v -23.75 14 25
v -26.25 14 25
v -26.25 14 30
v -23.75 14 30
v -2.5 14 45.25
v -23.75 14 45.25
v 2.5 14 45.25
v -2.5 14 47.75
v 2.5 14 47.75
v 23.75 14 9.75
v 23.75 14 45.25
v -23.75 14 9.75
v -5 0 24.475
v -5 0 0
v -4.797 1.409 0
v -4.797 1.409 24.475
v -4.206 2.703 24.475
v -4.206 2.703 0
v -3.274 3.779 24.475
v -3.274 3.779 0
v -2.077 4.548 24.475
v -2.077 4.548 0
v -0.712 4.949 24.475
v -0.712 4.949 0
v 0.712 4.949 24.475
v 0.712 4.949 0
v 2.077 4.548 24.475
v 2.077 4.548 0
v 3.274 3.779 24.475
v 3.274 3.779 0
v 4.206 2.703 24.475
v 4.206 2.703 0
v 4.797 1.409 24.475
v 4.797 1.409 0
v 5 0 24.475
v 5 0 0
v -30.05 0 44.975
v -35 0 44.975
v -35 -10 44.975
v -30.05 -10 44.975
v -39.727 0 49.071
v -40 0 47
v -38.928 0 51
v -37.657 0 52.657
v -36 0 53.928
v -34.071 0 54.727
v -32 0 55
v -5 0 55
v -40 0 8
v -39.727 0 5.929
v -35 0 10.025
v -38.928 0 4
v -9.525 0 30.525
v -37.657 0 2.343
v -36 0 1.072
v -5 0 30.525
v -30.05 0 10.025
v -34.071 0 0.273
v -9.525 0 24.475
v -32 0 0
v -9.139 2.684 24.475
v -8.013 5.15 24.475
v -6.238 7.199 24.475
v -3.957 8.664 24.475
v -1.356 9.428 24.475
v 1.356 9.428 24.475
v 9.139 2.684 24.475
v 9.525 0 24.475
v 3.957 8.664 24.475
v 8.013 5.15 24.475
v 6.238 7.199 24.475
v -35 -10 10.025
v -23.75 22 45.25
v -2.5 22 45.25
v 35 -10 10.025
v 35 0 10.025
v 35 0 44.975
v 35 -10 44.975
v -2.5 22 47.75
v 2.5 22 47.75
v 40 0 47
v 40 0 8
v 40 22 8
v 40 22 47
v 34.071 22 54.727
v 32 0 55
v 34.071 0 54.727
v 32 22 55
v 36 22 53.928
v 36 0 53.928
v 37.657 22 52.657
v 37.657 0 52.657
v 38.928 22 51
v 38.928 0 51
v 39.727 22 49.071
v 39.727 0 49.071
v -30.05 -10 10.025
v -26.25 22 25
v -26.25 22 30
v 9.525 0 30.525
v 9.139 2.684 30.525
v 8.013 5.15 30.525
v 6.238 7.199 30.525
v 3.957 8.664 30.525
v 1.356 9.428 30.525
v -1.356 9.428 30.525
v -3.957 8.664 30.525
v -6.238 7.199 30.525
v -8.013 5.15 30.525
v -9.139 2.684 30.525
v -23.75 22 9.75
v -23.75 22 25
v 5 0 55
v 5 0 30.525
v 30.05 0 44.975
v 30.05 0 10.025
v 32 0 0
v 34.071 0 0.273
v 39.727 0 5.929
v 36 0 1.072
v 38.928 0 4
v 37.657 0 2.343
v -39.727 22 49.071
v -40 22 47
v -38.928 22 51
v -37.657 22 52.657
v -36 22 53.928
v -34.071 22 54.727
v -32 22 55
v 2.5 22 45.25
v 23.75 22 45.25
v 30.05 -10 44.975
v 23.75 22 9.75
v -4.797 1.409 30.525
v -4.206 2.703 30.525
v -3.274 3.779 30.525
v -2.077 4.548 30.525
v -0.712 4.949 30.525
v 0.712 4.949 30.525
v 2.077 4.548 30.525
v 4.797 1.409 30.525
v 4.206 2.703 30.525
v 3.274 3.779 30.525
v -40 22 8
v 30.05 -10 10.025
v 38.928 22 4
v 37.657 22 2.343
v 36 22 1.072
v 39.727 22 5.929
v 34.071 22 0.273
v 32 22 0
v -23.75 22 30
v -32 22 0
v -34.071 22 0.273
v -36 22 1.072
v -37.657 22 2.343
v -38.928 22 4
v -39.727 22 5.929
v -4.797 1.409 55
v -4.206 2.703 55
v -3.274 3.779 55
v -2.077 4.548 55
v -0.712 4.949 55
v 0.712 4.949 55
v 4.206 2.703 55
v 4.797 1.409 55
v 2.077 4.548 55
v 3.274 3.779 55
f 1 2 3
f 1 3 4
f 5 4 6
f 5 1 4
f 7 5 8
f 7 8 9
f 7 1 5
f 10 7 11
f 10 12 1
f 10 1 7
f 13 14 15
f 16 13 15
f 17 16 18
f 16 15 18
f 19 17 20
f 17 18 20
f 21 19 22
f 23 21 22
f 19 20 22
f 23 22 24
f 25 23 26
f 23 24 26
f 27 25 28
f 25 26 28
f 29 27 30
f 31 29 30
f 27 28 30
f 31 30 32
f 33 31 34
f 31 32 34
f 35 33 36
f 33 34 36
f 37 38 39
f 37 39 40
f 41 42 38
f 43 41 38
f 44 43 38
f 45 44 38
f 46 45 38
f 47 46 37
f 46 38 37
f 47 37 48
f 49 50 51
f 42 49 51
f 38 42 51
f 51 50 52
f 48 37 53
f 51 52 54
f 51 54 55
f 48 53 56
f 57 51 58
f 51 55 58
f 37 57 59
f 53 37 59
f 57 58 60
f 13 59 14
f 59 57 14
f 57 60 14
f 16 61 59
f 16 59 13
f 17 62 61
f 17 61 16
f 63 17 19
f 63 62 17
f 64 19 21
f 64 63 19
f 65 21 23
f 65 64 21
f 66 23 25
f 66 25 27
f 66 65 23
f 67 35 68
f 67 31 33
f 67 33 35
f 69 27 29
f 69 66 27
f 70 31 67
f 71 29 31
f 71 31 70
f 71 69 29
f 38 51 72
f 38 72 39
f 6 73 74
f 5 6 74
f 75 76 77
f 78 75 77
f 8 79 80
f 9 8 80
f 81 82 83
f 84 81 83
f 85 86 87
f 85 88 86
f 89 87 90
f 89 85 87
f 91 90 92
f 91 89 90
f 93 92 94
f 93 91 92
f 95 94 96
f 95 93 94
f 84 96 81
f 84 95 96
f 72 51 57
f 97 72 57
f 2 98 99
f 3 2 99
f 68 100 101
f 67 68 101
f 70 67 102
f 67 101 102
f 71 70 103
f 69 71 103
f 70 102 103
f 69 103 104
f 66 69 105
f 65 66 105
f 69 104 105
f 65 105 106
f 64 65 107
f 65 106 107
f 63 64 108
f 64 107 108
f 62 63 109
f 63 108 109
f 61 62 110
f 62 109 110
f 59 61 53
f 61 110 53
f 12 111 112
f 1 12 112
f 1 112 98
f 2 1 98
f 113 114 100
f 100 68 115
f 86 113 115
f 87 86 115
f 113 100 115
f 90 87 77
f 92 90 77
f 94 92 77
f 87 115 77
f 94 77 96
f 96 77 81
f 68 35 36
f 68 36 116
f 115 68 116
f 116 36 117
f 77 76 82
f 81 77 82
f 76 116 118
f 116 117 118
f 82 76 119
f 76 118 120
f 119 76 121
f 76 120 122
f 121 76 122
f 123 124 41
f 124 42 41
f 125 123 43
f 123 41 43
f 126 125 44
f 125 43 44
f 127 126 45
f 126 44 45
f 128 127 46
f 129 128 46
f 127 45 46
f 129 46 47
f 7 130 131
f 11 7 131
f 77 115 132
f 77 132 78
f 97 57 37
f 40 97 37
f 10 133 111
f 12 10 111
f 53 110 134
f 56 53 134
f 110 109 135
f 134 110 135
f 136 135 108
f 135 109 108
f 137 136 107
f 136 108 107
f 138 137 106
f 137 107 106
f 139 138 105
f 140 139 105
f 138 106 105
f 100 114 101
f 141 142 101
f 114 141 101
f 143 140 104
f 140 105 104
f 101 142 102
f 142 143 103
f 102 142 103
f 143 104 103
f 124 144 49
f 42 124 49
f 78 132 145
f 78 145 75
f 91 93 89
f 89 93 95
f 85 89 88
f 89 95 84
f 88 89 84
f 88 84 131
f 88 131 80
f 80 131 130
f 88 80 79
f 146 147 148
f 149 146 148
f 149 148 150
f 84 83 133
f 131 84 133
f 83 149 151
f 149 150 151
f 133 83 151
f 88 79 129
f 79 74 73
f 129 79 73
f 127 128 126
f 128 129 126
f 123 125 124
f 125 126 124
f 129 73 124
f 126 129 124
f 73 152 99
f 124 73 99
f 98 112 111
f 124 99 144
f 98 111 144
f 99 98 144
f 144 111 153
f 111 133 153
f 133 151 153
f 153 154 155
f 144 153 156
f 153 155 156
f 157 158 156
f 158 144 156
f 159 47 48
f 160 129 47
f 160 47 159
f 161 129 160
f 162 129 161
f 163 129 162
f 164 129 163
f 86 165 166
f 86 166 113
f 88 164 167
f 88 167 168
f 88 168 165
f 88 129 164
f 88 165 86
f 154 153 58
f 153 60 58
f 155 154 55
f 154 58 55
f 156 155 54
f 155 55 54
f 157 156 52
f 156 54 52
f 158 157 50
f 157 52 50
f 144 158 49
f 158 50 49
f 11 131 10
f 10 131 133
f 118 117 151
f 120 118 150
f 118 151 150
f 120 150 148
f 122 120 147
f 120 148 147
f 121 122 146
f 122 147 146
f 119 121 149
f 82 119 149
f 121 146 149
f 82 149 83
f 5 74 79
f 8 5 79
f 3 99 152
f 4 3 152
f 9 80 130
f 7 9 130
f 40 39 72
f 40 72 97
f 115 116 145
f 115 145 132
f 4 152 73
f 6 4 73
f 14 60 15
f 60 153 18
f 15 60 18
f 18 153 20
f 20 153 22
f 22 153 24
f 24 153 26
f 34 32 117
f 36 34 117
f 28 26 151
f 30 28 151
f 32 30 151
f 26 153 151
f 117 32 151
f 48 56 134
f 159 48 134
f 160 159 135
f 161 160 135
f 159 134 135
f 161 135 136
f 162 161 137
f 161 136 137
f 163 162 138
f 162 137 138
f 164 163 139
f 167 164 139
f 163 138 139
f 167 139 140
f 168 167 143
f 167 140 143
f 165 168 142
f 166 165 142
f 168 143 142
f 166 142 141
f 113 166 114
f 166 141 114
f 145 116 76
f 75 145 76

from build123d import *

# Parameters (mm, degrees)
SALIENTE_EXTRUIR1_DEPTH = 55
CROQUIS2_R              = 9.525
CORTAR_EXTRUIR1_DEPTH   = 3.025
CROQUIS3_W              = 4.95
CROQUIS3_H              = 34.95
SALIENTE_EXTRUIR2_DEPTH = 10
REDONDEO1_R             = 8
CORTAR_EXTRUIR2_DEPTH   = 8


with BuildPart() as part:
    # Croquis1 → Saliente-Extruir1 (new body)
    with BuildSketch(Plane.XY):
        with BuildLine():
            Line((-40, 0), (-5, 0))
            ThreePointArc((-5, 0), (0, 5), (5, 0))
            Line((5, 0), (40, 0))
            Line((40, 0), (40, 22))
            Line((40, 22), (-40, 22))
            Line((-40, 22), (-40, 0))
        make_face()
    extrude(amount=SALIENTE_EXTRUIR1_DEPTH)

    # Croquis2 → Cortar-Extruir1 (cut, symmetric)
    with BuildSketch(Plane.XY.offset(27.5)):
        Circle(CROQUIS2_R)
    extrude(amount=CORTAR_EXTRUIR1_DEPTH, both=True, mode=Mode.SUBTRACT)

    # Croquis3 → Saliente-Extruir2 (add)
    with BuildSketch(Plane.XZ):
        with Locations((-32.525, 27.5)):
            Rectangle(CROQUIS3_W, CROQUIS3_H)
        with Locations((32.525, 27.5)):
            Rectangle(CROQUIS3_W, CROQUIS3_H)
    extrude(amount=SALIENTE_EXTRUIR2_DEPTH)

    # Redondeo1
    redondeo1_edges = [part.edges().sort_by_distance(p)[0] for p in [
        (40, 11, 55),
        (-40, 11, 55),
        (-40, 11, 0),
        (40, 11, 0),
    ]]
    fillet(redondeo1_edges, radius=REDONDEO1_R)

    # Croquis6 → Cortar-Extruir2 (cut)
    with BuildSketch(Plane(origin=(0, 22, 0), x_dir=(1, 0, 0), z_dir=(0, 1, 0))):
        Polygon((-23.75, -45.25), (-2.5, -45.25), (-2.5, -47.75), (2.5, -47.75), (2.5, -45.25), (23.75, -45.25), (23.75, -9.75), (-23.75, -9.75), (-23.75, -25), (-26.25, -25), (-26.25, -30), (-23.75, -30), align=None)
    extrude(amount=-CORTAR_EXTRUIR2_DEPTH, mode=Mode.SUBTRACT)


solid = part.part
